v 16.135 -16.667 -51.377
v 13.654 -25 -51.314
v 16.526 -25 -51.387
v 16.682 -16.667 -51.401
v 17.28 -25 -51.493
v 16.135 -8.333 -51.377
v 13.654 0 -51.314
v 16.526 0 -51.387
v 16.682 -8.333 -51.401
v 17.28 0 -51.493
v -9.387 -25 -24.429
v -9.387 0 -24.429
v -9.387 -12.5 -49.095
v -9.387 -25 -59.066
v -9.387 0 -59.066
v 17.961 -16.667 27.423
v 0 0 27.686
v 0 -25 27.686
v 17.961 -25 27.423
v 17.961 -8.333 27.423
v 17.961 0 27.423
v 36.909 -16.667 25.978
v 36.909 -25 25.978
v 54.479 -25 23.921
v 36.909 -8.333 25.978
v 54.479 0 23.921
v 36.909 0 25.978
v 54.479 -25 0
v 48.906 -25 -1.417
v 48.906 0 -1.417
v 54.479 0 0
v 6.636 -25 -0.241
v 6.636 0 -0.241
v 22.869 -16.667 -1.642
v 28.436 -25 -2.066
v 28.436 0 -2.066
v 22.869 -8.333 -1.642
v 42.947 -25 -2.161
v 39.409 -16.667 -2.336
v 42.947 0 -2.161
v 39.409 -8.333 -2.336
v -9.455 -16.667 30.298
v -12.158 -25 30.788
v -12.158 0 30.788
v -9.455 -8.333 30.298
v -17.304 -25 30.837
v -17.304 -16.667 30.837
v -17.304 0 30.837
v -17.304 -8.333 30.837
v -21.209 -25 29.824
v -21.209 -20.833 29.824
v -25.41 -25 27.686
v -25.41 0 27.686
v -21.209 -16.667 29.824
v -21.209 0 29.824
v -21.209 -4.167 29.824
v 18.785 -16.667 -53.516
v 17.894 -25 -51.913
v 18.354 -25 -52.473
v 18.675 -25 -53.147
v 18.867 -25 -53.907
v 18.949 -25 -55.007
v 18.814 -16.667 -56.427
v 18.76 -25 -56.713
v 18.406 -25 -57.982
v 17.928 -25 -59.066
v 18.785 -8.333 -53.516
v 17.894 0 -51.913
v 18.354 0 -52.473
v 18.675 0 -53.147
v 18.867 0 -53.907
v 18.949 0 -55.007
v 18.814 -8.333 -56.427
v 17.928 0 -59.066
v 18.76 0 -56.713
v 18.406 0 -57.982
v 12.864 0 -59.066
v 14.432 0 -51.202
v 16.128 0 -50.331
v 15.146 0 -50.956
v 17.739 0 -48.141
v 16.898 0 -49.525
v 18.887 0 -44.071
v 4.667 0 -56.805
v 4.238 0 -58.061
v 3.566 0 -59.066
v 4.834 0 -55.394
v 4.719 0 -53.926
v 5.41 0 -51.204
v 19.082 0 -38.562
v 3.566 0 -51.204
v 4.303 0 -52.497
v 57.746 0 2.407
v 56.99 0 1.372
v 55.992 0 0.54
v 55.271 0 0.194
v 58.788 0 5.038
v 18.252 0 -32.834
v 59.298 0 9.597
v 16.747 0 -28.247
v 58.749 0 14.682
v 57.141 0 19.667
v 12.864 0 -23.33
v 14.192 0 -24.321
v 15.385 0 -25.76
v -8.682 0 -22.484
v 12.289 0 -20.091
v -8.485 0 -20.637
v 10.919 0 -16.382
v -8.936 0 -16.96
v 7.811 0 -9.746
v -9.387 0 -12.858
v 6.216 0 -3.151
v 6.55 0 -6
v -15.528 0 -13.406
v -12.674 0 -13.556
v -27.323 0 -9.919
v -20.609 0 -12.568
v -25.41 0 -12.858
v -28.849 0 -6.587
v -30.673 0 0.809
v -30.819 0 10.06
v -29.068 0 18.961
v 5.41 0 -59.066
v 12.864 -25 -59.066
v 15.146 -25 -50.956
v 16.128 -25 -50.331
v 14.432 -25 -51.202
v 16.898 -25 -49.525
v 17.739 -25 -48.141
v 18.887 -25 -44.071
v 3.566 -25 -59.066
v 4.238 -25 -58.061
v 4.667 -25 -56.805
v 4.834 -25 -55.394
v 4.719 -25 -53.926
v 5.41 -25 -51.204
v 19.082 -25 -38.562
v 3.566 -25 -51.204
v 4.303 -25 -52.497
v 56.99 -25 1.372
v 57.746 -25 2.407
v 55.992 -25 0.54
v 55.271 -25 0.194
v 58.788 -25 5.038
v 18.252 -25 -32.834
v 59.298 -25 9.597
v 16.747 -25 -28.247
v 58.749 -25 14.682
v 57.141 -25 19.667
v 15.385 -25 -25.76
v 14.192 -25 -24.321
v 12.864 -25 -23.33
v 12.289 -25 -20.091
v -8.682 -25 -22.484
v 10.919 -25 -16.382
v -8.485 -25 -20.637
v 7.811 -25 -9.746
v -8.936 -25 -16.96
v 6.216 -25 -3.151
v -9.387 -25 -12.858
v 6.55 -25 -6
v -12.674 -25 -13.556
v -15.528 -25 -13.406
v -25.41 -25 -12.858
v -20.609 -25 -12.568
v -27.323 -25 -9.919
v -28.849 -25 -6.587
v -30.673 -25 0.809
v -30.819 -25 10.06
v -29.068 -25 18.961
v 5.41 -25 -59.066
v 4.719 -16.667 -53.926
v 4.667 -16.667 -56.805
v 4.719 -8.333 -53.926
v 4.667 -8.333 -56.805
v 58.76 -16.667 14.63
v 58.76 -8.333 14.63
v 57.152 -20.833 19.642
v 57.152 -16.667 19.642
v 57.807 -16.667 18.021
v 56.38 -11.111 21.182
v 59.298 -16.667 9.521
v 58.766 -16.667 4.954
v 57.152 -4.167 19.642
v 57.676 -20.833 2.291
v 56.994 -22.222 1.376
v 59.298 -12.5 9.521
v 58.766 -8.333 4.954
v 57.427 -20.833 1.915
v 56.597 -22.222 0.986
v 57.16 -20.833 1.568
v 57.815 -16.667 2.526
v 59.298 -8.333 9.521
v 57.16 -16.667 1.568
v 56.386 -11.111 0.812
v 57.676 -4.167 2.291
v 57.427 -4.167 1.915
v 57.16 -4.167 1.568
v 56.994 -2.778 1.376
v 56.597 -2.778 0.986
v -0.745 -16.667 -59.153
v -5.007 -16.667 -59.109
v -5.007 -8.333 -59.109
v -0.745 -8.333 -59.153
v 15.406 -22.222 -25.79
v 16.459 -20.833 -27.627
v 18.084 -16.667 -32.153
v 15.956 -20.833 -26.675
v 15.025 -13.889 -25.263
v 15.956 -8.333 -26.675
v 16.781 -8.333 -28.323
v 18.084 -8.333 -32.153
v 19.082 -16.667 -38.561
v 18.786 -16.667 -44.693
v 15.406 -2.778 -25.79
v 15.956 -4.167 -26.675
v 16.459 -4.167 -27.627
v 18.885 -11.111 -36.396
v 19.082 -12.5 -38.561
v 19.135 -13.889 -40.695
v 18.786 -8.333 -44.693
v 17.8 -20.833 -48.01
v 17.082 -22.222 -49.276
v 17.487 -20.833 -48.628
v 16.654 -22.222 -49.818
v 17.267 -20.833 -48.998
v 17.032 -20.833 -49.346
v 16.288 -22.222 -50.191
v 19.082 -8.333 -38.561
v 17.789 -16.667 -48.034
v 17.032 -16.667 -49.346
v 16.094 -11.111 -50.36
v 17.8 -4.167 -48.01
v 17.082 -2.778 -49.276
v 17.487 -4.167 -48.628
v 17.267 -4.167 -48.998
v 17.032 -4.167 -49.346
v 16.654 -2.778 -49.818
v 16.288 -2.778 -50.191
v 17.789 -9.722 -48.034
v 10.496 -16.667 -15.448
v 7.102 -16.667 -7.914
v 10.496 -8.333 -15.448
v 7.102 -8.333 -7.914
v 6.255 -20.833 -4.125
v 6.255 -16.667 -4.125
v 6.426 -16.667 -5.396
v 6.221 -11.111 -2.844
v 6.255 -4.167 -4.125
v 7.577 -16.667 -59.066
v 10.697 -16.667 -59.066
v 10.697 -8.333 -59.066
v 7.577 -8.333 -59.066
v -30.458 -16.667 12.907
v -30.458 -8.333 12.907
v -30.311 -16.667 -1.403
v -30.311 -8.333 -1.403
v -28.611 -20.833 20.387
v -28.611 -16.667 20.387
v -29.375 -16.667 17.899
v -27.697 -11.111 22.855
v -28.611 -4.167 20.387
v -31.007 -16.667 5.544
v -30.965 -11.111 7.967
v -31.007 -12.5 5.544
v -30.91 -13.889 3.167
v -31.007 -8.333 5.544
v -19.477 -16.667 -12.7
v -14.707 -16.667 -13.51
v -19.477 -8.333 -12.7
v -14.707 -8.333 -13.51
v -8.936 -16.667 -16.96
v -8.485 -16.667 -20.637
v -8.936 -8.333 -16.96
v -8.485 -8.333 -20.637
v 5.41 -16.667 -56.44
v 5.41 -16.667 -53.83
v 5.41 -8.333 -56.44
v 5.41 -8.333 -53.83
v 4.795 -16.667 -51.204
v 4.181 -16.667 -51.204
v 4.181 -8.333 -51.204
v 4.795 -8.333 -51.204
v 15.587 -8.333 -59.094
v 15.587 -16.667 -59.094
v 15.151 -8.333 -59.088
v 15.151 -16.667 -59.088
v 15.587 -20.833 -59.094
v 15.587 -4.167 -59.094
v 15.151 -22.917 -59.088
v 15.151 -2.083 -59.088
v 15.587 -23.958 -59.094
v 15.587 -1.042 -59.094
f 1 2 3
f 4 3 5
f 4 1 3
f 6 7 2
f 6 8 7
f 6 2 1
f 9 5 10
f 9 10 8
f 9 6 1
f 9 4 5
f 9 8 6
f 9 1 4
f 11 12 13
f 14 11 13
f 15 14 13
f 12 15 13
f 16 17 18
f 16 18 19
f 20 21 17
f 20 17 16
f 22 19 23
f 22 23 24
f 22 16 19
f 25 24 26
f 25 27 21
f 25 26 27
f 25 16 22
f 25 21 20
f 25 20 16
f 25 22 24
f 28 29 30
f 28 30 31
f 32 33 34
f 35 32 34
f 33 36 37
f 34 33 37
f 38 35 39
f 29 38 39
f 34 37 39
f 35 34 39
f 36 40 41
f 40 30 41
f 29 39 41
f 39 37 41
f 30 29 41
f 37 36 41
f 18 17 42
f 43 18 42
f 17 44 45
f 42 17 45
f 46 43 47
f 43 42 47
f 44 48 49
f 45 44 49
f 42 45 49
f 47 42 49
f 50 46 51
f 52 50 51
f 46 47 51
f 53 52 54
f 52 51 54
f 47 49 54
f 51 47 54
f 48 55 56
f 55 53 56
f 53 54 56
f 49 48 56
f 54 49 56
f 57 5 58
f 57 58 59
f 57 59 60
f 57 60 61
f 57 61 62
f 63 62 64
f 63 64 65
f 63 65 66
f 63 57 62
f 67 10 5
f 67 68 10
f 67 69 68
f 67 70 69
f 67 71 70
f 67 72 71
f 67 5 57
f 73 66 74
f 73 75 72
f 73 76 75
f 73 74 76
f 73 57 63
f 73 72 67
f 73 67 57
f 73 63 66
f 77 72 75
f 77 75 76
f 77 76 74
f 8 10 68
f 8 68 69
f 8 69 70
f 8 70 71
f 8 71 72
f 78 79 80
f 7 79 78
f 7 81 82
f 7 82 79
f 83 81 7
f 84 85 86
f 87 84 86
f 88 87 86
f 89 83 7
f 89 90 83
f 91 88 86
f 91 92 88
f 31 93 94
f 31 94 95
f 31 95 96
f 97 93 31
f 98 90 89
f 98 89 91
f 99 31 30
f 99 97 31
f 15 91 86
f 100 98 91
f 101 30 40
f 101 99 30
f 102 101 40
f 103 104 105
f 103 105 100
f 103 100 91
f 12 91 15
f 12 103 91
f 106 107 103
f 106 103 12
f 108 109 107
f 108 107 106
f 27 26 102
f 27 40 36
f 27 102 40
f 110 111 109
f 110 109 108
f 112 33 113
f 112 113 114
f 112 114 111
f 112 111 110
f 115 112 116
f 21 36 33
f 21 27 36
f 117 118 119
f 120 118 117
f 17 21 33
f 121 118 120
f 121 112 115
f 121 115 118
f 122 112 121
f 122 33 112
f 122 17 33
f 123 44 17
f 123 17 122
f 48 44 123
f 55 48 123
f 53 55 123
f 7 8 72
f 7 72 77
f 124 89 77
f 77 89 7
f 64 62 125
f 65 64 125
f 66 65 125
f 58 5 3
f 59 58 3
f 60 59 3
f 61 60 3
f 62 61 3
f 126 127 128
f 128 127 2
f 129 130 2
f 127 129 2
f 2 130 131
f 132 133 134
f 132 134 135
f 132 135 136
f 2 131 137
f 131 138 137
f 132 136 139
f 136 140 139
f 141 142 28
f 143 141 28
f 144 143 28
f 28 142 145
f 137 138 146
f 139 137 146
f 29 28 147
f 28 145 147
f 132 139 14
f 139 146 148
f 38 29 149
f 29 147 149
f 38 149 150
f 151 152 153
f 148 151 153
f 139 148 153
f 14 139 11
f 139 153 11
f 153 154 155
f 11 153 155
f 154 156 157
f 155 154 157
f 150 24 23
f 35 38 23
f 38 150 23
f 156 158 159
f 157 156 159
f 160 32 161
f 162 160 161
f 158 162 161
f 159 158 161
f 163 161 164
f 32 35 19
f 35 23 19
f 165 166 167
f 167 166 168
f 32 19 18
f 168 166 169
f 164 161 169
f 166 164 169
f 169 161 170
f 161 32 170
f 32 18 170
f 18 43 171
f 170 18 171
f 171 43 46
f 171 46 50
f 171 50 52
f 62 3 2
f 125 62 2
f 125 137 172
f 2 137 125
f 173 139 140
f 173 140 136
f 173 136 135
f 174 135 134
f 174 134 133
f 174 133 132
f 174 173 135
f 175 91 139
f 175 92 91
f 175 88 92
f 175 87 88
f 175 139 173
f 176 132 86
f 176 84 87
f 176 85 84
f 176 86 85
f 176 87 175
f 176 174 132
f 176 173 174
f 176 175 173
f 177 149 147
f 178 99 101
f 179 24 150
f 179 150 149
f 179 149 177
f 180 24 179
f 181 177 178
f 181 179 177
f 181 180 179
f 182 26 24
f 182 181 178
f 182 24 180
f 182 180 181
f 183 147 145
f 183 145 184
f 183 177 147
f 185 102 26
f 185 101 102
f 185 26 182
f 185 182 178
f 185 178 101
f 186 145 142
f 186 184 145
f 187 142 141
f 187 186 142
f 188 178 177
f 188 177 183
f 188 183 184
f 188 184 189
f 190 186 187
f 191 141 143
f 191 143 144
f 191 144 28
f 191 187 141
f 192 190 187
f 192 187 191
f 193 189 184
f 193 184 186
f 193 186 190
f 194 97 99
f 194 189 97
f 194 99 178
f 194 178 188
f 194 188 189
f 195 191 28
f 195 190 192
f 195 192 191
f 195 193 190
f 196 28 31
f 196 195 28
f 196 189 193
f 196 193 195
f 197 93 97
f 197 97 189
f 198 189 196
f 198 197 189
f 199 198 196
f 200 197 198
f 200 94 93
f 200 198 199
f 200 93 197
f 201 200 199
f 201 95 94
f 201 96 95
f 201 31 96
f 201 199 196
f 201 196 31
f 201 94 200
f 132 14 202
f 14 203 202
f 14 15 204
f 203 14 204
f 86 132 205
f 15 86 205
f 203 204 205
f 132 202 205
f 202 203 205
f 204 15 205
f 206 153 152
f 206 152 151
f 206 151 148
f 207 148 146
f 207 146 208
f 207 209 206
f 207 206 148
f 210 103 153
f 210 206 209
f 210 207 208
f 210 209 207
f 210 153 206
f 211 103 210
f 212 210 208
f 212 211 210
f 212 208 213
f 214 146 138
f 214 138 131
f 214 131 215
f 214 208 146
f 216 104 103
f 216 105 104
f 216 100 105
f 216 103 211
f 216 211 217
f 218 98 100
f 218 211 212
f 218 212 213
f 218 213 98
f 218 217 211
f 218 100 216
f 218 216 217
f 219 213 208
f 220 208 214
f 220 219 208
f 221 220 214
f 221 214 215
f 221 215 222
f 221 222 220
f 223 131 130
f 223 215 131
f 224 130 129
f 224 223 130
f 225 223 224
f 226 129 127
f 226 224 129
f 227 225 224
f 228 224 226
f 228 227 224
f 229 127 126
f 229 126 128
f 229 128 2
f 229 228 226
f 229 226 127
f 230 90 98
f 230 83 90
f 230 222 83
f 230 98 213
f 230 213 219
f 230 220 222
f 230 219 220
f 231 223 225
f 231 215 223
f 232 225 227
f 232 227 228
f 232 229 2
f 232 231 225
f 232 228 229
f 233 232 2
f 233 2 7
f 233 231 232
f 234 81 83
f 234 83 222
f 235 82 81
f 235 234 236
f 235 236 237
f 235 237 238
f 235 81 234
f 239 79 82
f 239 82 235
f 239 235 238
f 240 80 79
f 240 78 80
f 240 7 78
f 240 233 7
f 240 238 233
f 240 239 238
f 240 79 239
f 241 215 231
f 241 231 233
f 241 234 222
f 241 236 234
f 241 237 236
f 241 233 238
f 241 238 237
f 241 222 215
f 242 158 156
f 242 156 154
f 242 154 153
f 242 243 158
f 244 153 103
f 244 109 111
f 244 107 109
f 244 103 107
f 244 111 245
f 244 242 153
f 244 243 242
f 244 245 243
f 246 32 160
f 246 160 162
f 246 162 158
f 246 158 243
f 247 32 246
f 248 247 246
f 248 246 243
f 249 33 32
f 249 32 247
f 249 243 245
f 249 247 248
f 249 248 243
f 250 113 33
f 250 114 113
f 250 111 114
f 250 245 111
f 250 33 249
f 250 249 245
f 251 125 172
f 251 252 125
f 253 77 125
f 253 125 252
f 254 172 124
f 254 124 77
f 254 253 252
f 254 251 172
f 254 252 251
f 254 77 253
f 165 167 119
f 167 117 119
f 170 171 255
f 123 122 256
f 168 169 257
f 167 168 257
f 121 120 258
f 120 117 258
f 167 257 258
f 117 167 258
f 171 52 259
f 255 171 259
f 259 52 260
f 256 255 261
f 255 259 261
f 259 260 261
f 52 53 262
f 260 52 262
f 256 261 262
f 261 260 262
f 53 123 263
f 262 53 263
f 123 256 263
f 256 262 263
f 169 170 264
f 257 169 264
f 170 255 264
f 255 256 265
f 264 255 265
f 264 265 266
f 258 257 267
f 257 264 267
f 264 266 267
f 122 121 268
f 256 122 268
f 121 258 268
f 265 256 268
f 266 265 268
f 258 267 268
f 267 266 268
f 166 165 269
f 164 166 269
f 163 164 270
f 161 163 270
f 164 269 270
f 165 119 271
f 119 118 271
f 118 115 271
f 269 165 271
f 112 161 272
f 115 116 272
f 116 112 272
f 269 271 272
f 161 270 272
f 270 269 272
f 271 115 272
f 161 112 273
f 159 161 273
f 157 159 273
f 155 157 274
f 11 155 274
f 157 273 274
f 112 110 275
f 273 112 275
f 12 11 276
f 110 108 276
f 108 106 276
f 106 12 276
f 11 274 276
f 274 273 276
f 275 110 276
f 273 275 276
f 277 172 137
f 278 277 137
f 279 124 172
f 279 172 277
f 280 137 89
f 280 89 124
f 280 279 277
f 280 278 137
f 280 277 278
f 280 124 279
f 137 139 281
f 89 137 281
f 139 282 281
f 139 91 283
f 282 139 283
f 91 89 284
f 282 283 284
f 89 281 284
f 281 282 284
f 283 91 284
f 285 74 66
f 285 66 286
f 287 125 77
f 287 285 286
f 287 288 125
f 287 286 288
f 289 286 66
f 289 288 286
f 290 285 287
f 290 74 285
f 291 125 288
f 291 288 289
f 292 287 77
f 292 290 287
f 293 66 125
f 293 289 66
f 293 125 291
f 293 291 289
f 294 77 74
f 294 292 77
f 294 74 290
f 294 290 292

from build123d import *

# Parameters (mm, degrees)
F1_DEPTH = 25
F2_DEPTH = 25


with BuildPart() as f1:
    # F0 (on Front) → F1 (new body)
    with BuildSketch(Plane.XZ):
        with BuildLine():
            add(Edge.make_bspline(
                [(0, 27.6862987394), (16.6796203151, 28.2034940451), (38.3860760438, 26.0951526086), (54.4788755361, 23.9210502088)],
                knots=[0, 0, 0, 0, 54.6088360632, 54.6088360632, 54.6088360632, 54.6088360632], degree=3))
            add(Edge.make_bspline(
                [(0, 27.6862987394), (-10.8768893406, 30.7967068715), (-16.5566008002, 33.2203069514), (-25.4100486636, 27.6862987394)],
                knots=[0, 0, 0, 0, 25.4100486636, 25.4100486636, 25.4100486636, 25.4100486636], degree=3))
            add(Edge.make_bspline(
                [(-25.4100486636, 27.6862987394), (-33.2035310566, 13.4667754173), (-32.5410552323, -3.6254199222), (-25.4100486636, -12.8578795793)],
                knots=[0, 0, 0, 0, 40.5441783186, 40.5441783186, 40.5441783186, 40.5441783186], degree=3))
            add(Edge.make_bspline(
                [(-25.4100486636, -12.8578795793), (-18.3260211883, -11.4062287705), (-15.5515372751, -15.0504039361), (-9.3868758597, -12.8578795793)],
                knots=[0, 0, 0, 0, 16.0231728039, 16.0231728039, 16.0231728039, 16.0231728039], degree=3))
            add(Edge.make_bspline(
                [(-9.3868758597, -12.8578795793), (-9.3868758597, -17.3541016308), (-7.3570651382, -20.3983004515), (-9.3868758597, -24.4285451423)],
                knots=[0, 0, 0, 0, 11.570665563, 11.570665563, 11.570665563, 11.570665563], degree=3))
            add(Edge.make_bspline(
                [(-9.3868758597, -24.4285451423), (-9.3868758597, -32.6275384228), (-9.3868758597, -40.8957842737), (-9.3868758597, -49.0947775543)],
                knots=[0, 0, 0, 0, 24.666232412, 24.666232412, 24.666232412, 24.666232412], degree=3))
            add(Edge.make_bspline(
                [(-9.3868758597, -49.0947775543), (-9.3868758597, -52.4669426183), (-9.3868758597, -55.6938308612), (-9.3868758597, -59.0659959252)],
                knots=[0, 0, 0, 0, 9.9712183709, 9.9712183709, 9.9712183709, 9.9712183709], degree=3))
            add(Edge.make_bspline(
                [(-9.3868758597, -59.0659959252), (-4.8906540411, -59.0659959252), (-0.8265095118, -59.2609767353), (3.5657002554, -59.0659959252)],
                knots=[0, 0, 0, 0, 12.9525761151, 12.9525761151, 12.9525761151, 12.9525761151], degree=3))
            add(Edge.make_bspline(
                [(3.5657002554, -51.2038030888), (5.3739403374, -53.5912364721), (5.1391562447, -57.3704887664), (3.5657002554, -59.0659959252)],
                knots=[0, 0, 0, 0, 7.8621928364, 7.8621928364, 7.8621928364, 7.8621928364], degree=3))
            add(Edge.make_bspline(
                [(3.5657002554, -51.2038030888), (4.1805936213, -51.2038030888), (4.7954869871, -51.2038030888), (5.410380353, -51.2038030888)],
                knots=[0, 0, 0, 0, 1.8446800976, 1.8446800976, 1.8446800976, 1.8446800976], degree=3))
            add(Edge.make_bspline(
                [(5.410380353, -59.0659959252), (5.410380353, -56.4211590226), (5.410380353, -53.8486399914), (5.410380353, -51.2038030888)],
                knots=[0, 0, 0, 0, 7.8621928364, 7.8621928364, 7.8621928364, 7.8621928364], degree=3))
            add(Edge.make_bspline(
                [(12.8635961467, -59.0659959252), (11.8074451477, -59.0659959252), (6.4665313519, -59.0659959252), (5.410380353, -59.0659959252)],
                knots=[0, 0, 0, 0, 7.4532157937, 7.4532157937, 7.4532157937, 7.4532157937], degree=3))
            add(Edge.make_bspline(
                [(17.928149578, -59.0659959252), (13.3812715451, -59.1178093189), (17.3301265652, -59.090289033), (12.8635961467, -59.0659959252)],
                knots=[0, 0, 0, 0, 5.0645534314, 5.0645534314, 5.0645534314, 5.0645534314], degree=3))
            add(Edge.make_bspline(
                [(17.2803960741, -51.4933876693), (19.7103396058, -52.6835657656), (19.08519026, -56.9505158861), (17.928149578, -59.0659959252)],
                knots=[0, 0, 0, 0, 7.6002618638, 7.6002618638, 7.6002618638, 7.6002618638], degree=3))
            add(Edge.make_bspline(
                [(13.654217176, -51.3139771687), (17.7654348468, -51.4331050273), (15.9926018867, -51.3294887656), (17.2803960741, -51.4933876693)],
                knots=[0.2462376888, 0.2462376888, 0.2462376888, 0.2462376888, 4.4214584712, 4.4214584712, 4.4214584712, 4.4214584712], degree=3))
            add(Edge.make_bspline(
                [(12.8635961467, -23.3302187194), (19.9044561336, -27.0819576453), (22.1421128676, -50.8649725158), (13.654217176, -51.3139771687)],
                knots=[0, 0, 0, 0, 27.1481964254, 27.1481964254, 27.1481964254, 27.1481964254], degree=3))
            add(Edge.make_bspline(
                [(6.6355882659, -0.2411532101), (4.3193641621, -8.1446198373), (12.3277681457, -15.1127369167), (12.8635961467, -23.3302187194)],
                knots=[0, 0, 0, 0, 23.914285025, 23.914285025, 23.914285025, 23.914285025], degree=3))
            add(Edge.make_bspline(
                [(6.6355882659, -0.2411532101), (22.1245938581, -1.219978708), (40.7353670915, -4.6262567835), (54.4788755361, 0)],
                knots=[7.0133592268, 7.0133592268, 7.0133592268, 7.0133592268, 54.4788755361, 54.4788755361, 54.4788755361, 54.4788755361], degree=3))
            add(Edge.make_bspline(
                [(54.4788755361, 23.9210502088), (60.8903667061, 16.5228074724), (60.9189283628, 0.8926317144), (54.4788755361, 0)],
                knots=[0, 0, 0, 0, 23.9210502088, 23.9210502088, 23.9210502088, 23.9210502088], degree=3))
        make_face()
        with BuildLine():
            add(Edge.make_bspline(
                [(12.8635961467, -51.2904753379), (13.1488253912, -51.2991510662), (13.4117541327, -51.3069514878), (13.654217176, -51.3139771687)],
                knots=[0, 0, 0, 0, 0.2462376888, 0.2462376888, 0.2462376888, 0.2462376888], degree=3))
            add(Edge.make_bspline(
                [(13.654217176, -51.3139771687), (13.4003261953, -51.3274078511), (13.1368386863, -51.3199607754), (12.8635961467, -51.2904753379)],
                knots=[27.1481964254, 27.1481964254, 27.1481964254, 27.1481964254, 27.9602566185, 27.9602566185, 27.9602566185, 27.9602566185], degree=3))
        make_face(mode=Mode.SUBTRACT)
        with BuildLine():
            add(Edge.make_bspline(
                [(13.654217176, -51.3139771687), (13.4003261953, -51.3274078511), (13.1368386863, -51.3199607754), (12.8635961467, -51.2904753379)],
                knots=[27.1481964254, 27.1481964254, 27.1481964254, 27.1481964254, 27.9602566185, 27.9602566185, 27.9602566185, 27.9602566185], degree=3))
            add(Edge.make_bspline(
                [(12.8635961467, -51.2904753379), (13.1488253912, -51.2991510662), (13.4117541327, -51.3069514878), (13.654217176, -51.3139771687)],
                knots=[0, 0, 0, 0, 0.2462376888, 0.2462376888, 0.2462376888, 0.2462376888], degree=3))
        make_face()
    extrude(amount=F1_DEPTH)

    # F0 (on Front) → F2 (join)
    with BuildSketch(Plane.XZ):
        with BuildLine():
            add(Edge.make_bspline(
                [(0, 27.6862987394), (16.6796203151, 28.2034940451), (38.3860760438, 26.0951526086), (54.4788755361, 23.9210502088)],
                knots=[0, 0, 0, 0, 54.6088360632, 54.6088360632, 54.6088360632, 54.6088360632], degree=3))
            add(Edge.make_bspline(
                [(0, 27.6862987394), (-10.8768893406, 30.7967068715), (-16.5566008002, 33.2203069514), (-25.4100486636, 27.6862987394)],
                knots=[0, 0, 0, 0, 25.4100486636, 25.4100486636, 25.4100486636, 25.4100486636], degree=3))
            add(Edge.make_bspline(
                [(-25.4100486636, 27.6862987394), (-33.2035310566, 13.4667754173), (-32.5410552323, -3.6254199222), (-25.4100486636, -12.8578795793)],
                knots=[0, 0, 0, 0, 40.5441783186, 40.5441783186, 40.5441783186, 40.5441783186], degree=3))
            add(Edge.make_bspline(
                [(-25.4100486636, -12.8578795793), (-18.3260211883, -11.4062287705), (-15.5515372751, -15.0504039361), (-9.3868758597, -12.8578795793)],
                knots=[0, 0, 0, 0, 16.0231728039, 16.0231728039, 16.0231728039, 16.0231728039], degree=3))
            add(Edge.make_bspline(
                [(-9.3868758597, -12.8578795793), (-9.3868758597, -17.3541016308), (-7.3570651382, -20.3983004515), (-9.3868758597, -24.4285451423)],
                knots=[0, 0, 0, 0, 11.570665563, 11.570665563, 11.570665563, 11.570665563], degree=3))
            add(Edge.make_bspline(
                [(-9.3868758597, -24.4285451423), (-9.3868758597, -32.6275384228), (-9.3868758597, -40.8957842737), (-9.3868758597, -49.0947775543)],
                knots=[0, 0, 0, 0, 24.666232412, 24.666232412, 24.666232412, 24.666232412], degree=3))
            add(Edge.make_bspline(
                [(-9.3868758597, -49.0947775543), (-9.3868758597, -52.4669426183), (-9.3868758597, -55.6938308612), (-9.3868758597, -59.0659959252)],
                knots=[0, 0, 0, 0, 9.9712183709, 9.9712183709, 9.9712183709, 9.9712183709], degree=3))
            add(Edge.make_bspline(
                [(-9.3868758597, -59.0659959252), (-4.8906540411, -59.0659959252), (-0.8265095118, -59.2609767353), (3.5657002554, -59.0659959252)],
                knots=[0, 0, 0, 0, 12.9525761151, 12.9525761151, 12.9525761151, 12.9525761151], degree=3))
            add(Edge.make_bspline(
                [(3.5657002554, -51.2038030888), (5.3739403374, -53.5912364721), (5.1391562447, -57.3704887664), (3.5657002554, -59.0659959252)],
                knots=[0, 0, 0, 0, 7.8621928364, 7.8621928364, 7.8621928364, 7.8621928364], degree=3))
            add(Edge.make_bspline(
                [(3.5657002554, -51.2038030888), (4.1805936213, -51.2038030888), (4.7954869871, -51.2038030888), (5.410380353, -51.2038030888)],
                knots=[0, 0, 0, 0, 1.8446800976, 1.8446800976, 1.8446800976, 1.8446800976], degree=3))
            add(Edge.make_bspline(
                [(5.410380353, -59.0659959252), (5.410380353, -56.4211590226), (5.410380353, -53.8486399914), (5.410380353, -51.2038030888)],
                knots=[0, 0, 0, 0, 7.8621928364, 7.8621928364, 7.8621928364, 7.8621928364], degree=3))
            add(Edge.make_bspline(
                [(12.8635961467, -59.0659959252), (11.8074451477, -59.0659959252), (6.4665313519, -59.0659959252), (5.410380353, -59.0659959252)],
                knots=[0, 0, 0, 0, 7.4532157937, 7.4532157937, 7.4532157937, 7.4532157937], degree=3))
            add(Edge.make_bspline(
                [(17.928149578, -59.0659959252), (13.3812715451, -59.1178093189), (17.3301265652, -59.090289033), (12.8635961467, -59.0659959252)],
                knots=[0, 0, 0, 0, 5.0645534314, 5.0645534314, 5.0645534314, 5.0645534314], degree=3))
            add(Edge.make_bspline(
                [(17.2803960741, -51.4933876693), (19.7103396058, -52.6835657656), (19.08519026, -56.9505158861), (17.928149578, -59.0659959252)],
                knots=[0, 0, 0, 0, 7.6002618638, 7.6002618638, 7.6002618638, 7.6002618638], degree=3))
            add(Edge.make_bspline(
                [(13.654217176, -51.3139771687), (17.7654348468, -51.4331050273), (15.9926018867, -51.3294887656), (17.2803960741, -51.4933876693)],
                knots=[0.2462376888, 0.2462376888, 0.2462376888, 0.2462376888, 4.4214584712, 4.4214584712, 4.4214584712, 4.4214584712], degree=3))
            add(Edge.make_bspline(
                [(12.8635961467, -23.3302187194), (19.9044561336, -27.0819576453), (22.1421128676, -50.8649725158), (13.654217176, -51.3139771687)],
                knots=[0, 0, 0, 0, 27.1481964254, 27.1481964254, 27.1481964254, 27.1481964254], degree=3))
            add(Edge.make_bspline(
                [(6.6355882659, -0.2411532101), (4.3193641621, -8.1446198373), (12.3277681457, -15.1127369167), (12.8635961467, -23.3302187194)],
                knots=[0, 0, 0, 0, 23.914285025, 23.914285025, 23.914285025, 23.914285025], degree=3))
            add(Edge.make_bspline(
                [(6.6355882659, -0.2411532101), (22.1245938581, -1.219978708), (40.7353670915, -4.6262567835), (54.4788755361, 0)],
                knots=[7.0133592268, 7.0133592268, 7.0133592268, 7.0133592268, 54.4788755361, 54.4788755361, 54.4788755361, 54.4788755361], degree=3))
            add(Edge.make_bspline(
                [(54.4788755361, 23.9210502088), (60.8903667061, 16.5228074724), (60.9189283628, 0.8926317144), (54.4788755361, 0)],
                knots=[0, 0, 0, 0, 23.9210502088, 23.9210502088, 23.9210502088, 23.9210502088], degree=3))
        make_face()
        with BuildLine():
            add(Edge.make_bspline(
                [(12.8635961467, -51.2904753379), (13.1488253912, -51.2991510662), (13.4117541327, -51.3069514878), (13.654217176, -51.3139771687)],
                knots=[0, 0, 0, 0, 0.2462376888, 0.2462376888, 0.2462376888, 0.2462376888], degree=3))
            add(Edge.make_bspline(
                [(13.654217176, -51.3139771687), (13.4003261953, -51.3274078511), (13.1368386863, -51.3199607754), (12.8635961467, -51.2904753379)],
                knots=[27.1481964254, 27.1481964254, 27.1481964254, 27.1481964254, 27.9602566185, 27.9602566185, 27.9602566185, 27.9602566185], degree=3))
        make_face(mode=Mode.SUBTRACT)
        with BuildLine():
            add(Edge.make_bspline(
                [(13.654217176, -51.3139771687), (13.4003261953, -51.3274078511), (13.1368386863, -51.3199607754), (12.8635961467, -51.2904753379)],
                knots=[27.1481964254, 27.1481964254, 27.1481964254, 27.1481964254, 27.9602566185, 27.9602566185, 27.9602566185, 27.9602566185], degree=3))
            add(Edge.make_bspline(
                [(12.8635961467, -51.2904753379), (13.1488253912, -51.2991510662), (13.4117541327, -51.3069514878), (13.654217176, -51.3139771687)],
                knots=[0, 0, 0, 0, 0.2462376888, 0.2462376888, 0.2462376888, 0.2462376888], degree=3))
        make_face()
    extrude(amount=F2_DEPTH)


solid = f1.part
